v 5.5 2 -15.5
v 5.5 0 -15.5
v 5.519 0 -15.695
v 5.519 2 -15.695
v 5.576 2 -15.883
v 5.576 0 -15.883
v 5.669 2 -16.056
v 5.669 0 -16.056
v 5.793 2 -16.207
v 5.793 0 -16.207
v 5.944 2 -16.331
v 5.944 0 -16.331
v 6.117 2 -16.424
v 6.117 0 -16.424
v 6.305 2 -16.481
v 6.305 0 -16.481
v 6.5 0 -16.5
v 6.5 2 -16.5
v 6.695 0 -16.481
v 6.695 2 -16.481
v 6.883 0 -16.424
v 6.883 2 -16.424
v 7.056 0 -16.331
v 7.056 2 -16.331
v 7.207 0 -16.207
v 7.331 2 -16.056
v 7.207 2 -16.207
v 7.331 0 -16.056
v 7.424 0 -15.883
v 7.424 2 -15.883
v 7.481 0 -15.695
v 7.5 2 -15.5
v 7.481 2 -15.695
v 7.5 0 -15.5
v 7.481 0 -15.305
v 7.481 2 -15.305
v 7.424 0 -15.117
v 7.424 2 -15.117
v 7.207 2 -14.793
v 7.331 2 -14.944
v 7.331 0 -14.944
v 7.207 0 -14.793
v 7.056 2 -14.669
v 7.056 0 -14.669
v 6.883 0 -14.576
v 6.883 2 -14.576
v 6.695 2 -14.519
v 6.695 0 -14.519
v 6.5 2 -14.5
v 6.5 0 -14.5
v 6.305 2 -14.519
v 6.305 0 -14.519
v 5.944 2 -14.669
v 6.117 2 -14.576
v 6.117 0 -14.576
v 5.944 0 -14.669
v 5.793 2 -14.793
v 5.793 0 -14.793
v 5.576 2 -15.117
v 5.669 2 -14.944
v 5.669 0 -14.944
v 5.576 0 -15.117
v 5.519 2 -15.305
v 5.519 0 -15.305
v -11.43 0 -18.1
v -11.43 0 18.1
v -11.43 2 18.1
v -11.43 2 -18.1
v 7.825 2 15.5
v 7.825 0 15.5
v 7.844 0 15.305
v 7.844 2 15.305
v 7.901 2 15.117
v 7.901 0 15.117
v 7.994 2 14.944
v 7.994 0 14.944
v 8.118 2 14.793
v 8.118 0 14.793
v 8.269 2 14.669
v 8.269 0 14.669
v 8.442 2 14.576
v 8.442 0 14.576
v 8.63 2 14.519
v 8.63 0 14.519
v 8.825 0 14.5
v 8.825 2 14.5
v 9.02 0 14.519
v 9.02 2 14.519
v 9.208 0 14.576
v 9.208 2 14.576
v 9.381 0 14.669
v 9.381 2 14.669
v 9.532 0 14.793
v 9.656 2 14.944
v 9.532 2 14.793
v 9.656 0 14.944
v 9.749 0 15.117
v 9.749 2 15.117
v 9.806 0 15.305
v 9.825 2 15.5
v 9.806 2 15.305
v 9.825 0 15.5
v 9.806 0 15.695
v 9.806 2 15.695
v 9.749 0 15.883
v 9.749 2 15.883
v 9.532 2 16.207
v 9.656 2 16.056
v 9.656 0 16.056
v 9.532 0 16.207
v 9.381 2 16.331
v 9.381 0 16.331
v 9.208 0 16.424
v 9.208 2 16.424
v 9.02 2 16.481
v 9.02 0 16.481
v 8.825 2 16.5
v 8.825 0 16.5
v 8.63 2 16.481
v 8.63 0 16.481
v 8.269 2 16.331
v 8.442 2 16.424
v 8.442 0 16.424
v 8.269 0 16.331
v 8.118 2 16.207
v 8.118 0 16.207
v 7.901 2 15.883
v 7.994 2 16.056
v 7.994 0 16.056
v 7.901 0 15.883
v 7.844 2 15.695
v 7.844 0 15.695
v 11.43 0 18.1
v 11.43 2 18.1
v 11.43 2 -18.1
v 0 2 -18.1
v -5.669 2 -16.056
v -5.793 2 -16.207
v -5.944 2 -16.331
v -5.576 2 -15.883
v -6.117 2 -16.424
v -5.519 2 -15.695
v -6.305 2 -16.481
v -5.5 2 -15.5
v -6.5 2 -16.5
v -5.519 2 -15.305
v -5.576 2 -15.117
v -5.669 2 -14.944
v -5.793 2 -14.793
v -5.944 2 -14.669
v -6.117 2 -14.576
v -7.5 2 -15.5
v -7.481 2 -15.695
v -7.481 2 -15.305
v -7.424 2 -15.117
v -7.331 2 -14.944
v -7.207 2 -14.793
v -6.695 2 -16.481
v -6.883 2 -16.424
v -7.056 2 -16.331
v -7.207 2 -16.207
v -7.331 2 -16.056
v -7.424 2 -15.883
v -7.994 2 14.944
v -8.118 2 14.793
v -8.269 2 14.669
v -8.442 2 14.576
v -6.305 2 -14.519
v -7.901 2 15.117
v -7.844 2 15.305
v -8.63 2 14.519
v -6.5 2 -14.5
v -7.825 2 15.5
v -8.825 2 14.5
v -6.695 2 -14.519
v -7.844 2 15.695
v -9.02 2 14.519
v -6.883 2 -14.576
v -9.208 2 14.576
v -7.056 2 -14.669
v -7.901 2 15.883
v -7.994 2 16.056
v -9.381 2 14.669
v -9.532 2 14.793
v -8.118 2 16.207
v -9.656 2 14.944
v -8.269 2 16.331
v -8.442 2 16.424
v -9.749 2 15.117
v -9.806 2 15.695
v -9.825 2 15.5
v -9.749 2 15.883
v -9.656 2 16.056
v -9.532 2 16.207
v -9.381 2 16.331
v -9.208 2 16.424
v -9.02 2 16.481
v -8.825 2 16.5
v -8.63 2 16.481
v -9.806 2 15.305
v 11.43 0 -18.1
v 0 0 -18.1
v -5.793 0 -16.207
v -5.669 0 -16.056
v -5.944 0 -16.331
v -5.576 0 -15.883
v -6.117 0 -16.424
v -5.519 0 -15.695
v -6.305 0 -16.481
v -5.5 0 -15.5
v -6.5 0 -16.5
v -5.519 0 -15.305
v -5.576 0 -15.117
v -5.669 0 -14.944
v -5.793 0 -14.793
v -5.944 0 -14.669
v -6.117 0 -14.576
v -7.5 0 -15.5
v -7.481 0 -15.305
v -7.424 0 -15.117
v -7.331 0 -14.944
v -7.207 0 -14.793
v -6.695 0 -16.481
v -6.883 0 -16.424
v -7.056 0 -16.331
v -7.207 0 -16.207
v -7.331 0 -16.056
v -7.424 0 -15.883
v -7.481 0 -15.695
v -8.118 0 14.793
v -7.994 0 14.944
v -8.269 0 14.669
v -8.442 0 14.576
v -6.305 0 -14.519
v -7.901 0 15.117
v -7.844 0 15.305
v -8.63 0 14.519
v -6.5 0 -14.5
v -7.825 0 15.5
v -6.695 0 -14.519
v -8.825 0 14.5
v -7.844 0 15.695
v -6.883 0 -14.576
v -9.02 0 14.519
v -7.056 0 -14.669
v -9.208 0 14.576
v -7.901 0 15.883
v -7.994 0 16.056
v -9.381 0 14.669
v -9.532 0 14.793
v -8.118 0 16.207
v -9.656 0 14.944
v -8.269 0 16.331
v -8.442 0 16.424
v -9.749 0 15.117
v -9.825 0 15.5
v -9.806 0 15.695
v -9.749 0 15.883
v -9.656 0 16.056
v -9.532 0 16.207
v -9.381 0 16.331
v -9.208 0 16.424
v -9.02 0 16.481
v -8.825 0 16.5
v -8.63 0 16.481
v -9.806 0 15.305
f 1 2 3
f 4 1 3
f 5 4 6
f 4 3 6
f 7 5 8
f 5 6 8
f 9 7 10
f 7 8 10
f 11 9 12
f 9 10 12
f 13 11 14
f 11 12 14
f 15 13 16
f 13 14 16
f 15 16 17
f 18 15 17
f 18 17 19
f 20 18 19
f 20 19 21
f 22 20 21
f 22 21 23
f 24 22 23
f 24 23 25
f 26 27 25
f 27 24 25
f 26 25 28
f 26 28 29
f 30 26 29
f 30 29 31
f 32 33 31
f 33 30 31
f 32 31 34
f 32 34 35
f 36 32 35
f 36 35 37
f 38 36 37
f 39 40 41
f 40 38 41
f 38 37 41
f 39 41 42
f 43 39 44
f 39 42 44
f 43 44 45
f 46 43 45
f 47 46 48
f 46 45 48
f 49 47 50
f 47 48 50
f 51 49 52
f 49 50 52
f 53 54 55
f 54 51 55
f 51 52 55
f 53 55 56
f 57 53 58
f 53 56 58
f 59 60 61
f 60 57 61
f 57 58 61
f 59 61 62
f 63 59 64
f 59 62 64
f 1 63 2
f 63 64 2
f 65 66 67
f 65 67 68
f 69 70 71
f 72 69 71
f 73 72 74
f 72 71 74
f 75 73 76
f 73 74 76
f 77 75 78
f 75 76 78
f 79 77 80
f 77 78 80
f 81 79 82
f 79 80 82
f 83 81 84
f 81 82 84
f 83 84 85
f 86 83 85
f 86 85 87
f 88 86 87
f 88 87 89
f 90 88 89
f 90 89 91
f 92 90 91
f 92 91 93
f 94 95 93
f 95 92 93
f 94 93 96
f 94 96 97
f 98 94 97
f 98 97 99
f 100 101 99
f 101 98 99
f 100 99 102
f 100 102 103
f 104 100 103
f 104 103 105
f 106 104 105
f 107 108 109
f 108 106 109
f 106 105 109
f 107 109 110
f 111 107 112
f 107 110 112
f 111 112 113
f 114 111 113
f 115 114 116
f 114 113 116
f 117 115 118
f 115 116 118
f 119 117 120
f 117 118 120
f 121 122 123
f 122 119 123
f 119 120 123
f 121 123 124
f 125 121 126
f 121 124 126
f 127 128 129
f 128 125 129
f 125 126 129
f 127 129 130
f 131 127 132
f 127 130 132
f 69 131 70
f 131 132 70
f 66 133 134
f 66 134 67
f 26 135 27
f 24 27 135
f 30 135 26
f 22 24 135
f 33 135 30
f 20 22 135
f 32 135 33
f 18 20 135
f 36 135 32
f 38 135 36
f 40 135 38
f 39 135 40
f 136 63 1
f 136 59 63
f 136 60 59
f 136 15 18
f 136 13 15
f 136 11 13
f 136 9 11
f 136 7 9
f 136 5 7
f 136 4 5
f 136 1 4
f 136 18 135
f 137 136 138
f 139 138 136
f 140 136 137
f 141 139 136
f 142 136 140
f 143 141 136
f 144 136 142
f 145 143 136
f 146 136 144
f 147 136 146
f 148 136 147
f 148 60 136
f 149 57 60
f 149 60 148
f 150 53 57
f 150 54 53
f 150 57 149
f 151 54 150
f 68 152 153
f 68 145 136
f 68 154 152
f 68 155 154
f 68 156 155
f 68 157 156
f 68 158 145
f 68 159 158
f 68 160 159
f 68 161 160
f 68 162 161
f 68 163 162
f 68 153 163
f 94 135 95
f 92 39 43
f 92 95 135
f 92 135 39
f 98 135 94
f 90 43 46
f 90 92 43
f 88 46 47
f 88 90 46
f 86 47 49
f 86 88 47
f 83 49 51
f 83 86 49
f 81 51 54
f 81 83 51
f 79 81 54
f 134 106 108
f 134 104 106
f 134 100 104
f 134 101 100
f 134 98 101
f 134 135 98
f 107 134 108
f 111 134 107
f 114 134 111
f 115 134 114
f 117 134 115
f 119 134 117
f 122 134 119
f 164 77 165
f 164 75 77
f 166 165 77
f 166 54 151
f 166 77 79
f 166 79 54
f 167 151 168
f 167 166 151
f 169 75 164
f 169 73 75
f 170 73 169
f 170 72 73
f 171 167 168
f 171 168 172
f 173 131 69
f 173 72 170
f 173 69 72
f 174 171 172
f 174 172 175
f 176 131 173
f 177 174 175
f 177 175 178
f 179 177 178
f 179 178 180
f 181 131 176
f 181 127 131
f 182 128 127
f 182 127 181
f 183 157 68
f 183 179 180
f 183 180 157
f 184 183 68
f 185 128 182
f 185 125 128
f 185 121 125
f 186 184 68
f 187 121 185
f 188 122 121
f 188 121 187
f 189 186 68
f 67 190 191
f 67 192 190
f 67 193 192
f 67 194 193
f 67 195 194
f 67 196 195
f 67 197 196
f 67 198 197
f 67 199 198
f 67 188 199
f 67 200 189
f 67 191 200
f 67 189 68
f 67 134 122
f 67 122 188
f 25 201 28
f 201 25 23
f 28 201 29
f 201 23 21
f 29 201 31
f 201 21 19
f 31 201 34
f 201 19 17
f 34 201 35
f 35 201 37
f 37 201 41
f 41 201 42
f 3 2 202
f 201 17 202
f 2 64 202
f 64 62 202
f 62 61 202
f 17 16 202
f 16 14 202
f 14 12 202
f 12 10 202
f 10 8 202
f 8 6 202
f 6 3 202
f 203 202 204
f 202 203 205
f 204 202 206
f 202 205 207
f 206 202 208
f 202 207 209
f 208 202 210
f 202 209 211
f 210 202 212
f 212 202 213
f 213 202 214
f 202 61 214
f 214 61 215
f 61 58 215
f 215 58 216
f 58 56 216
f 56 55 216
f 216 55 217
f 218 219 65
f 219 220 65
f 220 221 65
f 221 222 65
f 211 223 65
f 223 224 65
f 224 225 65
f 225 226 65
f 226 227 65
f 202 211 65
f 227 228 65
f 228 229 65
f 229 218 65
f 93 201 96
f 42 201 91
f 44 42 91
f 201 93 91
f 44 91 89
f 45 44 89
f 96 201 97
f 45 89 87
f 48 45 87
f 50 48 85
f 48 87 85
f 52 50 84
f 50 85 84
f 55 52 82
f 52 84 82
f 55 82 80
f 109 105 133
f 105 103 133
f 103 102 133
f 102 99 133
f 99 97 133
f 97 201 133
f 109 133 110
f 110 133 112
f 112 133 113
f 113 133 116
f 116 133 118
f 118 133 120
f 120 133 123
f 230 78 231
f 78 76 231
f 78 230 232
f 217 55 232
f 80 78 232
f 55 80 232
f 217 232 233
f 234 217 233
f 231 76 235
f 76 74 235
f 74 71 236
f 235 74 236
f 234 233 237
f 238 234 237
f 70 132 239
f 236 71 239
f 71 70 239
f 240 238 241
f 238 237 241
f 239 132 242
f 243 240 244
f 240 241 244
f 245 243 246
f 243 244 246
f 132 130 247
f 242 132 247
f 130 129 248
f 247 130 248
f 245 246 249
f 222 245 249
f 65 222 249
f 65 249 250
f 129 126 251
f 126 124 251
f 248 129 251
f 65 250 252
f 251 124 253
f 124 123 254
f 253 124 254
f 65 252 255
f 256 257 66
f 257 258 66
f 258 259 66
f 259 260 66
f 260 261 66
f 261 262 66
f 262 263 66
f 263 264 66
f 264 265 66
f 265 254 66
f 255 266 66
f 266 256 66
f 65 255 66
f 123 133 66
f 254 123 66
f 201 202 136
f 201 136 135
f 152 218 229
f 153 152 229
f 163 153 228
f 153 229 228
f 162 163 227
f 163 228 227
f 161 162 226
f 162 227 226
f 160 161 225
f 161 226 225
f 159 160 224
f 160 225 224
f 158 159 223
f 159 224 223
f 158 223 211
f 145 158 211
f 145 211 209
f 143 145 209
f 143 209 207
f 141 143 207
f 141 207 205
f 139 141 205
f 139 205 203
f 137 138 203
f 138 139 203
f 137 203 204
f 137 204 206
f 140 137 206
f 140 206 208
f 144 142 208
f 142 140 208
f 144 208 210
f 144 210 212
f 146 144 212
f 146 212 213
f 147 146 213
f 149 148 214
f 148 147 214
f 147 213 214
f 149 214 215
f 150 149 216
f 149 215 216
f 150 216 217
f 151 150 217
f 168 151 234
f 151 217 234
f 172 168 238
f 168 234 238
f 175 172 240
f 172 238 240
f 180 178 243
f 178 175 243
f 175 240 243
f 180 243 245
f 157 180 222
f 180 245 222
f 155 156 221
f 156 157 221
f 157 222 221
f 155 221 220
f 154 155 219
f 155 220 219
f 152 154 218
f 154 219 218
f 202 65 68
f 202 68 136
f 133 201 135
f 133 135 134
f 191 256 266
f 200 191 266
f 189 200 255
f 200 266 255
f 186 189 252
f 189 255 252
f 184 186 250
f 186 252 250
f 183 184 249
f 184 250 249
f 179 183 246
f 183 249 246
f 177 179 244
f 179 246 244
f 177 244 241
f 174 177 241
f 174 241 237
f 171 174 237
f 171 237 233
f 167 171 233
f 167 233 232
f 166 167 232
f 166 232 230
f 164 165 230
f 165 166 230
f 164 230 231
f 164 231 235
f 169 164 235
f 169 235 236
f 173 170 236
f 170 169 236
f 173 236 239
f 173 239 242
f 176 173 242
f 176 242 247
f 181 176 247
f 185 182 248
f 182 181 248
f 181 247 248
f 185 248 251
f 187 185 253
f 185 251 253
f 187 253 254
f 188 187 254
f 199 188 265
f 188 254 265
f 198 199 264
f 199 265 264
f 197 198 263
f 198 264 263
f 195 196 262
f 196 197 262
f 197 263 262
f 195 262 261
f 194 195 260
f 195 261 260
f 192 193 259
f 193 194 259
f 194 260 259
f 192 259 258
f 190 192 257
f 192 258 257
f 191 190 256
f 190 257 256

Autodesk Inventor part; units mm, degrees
ref_plane "YZ Plane" through (0, 0, 0) normal (1, 0, 0) x (0, 1, 0)
ref_plane "XZ Plane" through (0, 0, 0) normal (0, 1, 0) x (-1, 0, 0)
ref_plane "XY Plane" through (0, 0, 0) normal (0, 0, 1) x (1, 0, 0)
sketch "Sketch1" plane through (0, 0, 0) normal (0, 1, 0) x (-1, 0, 0)
  line L0 (-11.43, 18.1) -> (11.43, 18.1)
  line L1 (11.43, 18.1) -> (11.43, -18.1)
  line L2 (11.43, -18.1) -> (-11.43, -18.1)
  line L3 (-11.43, -18.1) -> (-11.43, 18.1)
  line L4 (-11.43, 18.1) -> (11.43, -18.1) construction
  line L5 (11.43, 18.1) -> (-11.43, -18.1) construction
  line L6 (-8.825, 15.5) -> (8.825, 15.5) construction
  line L7 (8.825, 15.5) -> (8.825, -15.5) construction
  line L8 (8.825, -15.5) -> (-8.825, -15.5) construction
  line L9 (-8.825, -15.5) -> (-8.825, 15.5) construction
  line L10 (-8.825, 15.5) -> (8.825, -15.5) construction
  line L11 (8.825, 15.5) -> (-8.825, -15.5) construction
  circle A0 centre (8.825, 15.5) radius 1
  circle A1 centre (-8.825, 15.5) radius 1
  circle A2 centre (6.5, -15.5) radius 1
  line L12 (0, 0) -> (0, -18.1)
  circle A3 centre (-6.5, -15.5) radius 1
  dimension "d0" = 22.86
  dimension "d1" = 36.2
  dimension "d2" = 17.65
  dimension "d3" = 31
  dimension "d4" = 6.5
  dimension "d5" = 2
  dimension "d6" = 2
  dimension "d7" = 2
extrude "Extrusion1" add sketch "Sketch1" along normal blind 2
sketch "Sketch2" plane through (0, 2, 0) normal (0, 1, 0) x (1, 0, 0)
  line L0 (-11.43, 18.1) -> (11.3685, 18.1) construction
  line L1 (11.3685, 18.1) -> (11.3685, -18.1704) construction
  line L2 (11.3685, -18.1704) -> (-11.43, -18.1704) construction
  line L3 (-11.43, -18.1704) -> (-11.43, 18.1) construction
  point P0 (0, 0)
decal "Decal1"
properties part number "powerboost"
